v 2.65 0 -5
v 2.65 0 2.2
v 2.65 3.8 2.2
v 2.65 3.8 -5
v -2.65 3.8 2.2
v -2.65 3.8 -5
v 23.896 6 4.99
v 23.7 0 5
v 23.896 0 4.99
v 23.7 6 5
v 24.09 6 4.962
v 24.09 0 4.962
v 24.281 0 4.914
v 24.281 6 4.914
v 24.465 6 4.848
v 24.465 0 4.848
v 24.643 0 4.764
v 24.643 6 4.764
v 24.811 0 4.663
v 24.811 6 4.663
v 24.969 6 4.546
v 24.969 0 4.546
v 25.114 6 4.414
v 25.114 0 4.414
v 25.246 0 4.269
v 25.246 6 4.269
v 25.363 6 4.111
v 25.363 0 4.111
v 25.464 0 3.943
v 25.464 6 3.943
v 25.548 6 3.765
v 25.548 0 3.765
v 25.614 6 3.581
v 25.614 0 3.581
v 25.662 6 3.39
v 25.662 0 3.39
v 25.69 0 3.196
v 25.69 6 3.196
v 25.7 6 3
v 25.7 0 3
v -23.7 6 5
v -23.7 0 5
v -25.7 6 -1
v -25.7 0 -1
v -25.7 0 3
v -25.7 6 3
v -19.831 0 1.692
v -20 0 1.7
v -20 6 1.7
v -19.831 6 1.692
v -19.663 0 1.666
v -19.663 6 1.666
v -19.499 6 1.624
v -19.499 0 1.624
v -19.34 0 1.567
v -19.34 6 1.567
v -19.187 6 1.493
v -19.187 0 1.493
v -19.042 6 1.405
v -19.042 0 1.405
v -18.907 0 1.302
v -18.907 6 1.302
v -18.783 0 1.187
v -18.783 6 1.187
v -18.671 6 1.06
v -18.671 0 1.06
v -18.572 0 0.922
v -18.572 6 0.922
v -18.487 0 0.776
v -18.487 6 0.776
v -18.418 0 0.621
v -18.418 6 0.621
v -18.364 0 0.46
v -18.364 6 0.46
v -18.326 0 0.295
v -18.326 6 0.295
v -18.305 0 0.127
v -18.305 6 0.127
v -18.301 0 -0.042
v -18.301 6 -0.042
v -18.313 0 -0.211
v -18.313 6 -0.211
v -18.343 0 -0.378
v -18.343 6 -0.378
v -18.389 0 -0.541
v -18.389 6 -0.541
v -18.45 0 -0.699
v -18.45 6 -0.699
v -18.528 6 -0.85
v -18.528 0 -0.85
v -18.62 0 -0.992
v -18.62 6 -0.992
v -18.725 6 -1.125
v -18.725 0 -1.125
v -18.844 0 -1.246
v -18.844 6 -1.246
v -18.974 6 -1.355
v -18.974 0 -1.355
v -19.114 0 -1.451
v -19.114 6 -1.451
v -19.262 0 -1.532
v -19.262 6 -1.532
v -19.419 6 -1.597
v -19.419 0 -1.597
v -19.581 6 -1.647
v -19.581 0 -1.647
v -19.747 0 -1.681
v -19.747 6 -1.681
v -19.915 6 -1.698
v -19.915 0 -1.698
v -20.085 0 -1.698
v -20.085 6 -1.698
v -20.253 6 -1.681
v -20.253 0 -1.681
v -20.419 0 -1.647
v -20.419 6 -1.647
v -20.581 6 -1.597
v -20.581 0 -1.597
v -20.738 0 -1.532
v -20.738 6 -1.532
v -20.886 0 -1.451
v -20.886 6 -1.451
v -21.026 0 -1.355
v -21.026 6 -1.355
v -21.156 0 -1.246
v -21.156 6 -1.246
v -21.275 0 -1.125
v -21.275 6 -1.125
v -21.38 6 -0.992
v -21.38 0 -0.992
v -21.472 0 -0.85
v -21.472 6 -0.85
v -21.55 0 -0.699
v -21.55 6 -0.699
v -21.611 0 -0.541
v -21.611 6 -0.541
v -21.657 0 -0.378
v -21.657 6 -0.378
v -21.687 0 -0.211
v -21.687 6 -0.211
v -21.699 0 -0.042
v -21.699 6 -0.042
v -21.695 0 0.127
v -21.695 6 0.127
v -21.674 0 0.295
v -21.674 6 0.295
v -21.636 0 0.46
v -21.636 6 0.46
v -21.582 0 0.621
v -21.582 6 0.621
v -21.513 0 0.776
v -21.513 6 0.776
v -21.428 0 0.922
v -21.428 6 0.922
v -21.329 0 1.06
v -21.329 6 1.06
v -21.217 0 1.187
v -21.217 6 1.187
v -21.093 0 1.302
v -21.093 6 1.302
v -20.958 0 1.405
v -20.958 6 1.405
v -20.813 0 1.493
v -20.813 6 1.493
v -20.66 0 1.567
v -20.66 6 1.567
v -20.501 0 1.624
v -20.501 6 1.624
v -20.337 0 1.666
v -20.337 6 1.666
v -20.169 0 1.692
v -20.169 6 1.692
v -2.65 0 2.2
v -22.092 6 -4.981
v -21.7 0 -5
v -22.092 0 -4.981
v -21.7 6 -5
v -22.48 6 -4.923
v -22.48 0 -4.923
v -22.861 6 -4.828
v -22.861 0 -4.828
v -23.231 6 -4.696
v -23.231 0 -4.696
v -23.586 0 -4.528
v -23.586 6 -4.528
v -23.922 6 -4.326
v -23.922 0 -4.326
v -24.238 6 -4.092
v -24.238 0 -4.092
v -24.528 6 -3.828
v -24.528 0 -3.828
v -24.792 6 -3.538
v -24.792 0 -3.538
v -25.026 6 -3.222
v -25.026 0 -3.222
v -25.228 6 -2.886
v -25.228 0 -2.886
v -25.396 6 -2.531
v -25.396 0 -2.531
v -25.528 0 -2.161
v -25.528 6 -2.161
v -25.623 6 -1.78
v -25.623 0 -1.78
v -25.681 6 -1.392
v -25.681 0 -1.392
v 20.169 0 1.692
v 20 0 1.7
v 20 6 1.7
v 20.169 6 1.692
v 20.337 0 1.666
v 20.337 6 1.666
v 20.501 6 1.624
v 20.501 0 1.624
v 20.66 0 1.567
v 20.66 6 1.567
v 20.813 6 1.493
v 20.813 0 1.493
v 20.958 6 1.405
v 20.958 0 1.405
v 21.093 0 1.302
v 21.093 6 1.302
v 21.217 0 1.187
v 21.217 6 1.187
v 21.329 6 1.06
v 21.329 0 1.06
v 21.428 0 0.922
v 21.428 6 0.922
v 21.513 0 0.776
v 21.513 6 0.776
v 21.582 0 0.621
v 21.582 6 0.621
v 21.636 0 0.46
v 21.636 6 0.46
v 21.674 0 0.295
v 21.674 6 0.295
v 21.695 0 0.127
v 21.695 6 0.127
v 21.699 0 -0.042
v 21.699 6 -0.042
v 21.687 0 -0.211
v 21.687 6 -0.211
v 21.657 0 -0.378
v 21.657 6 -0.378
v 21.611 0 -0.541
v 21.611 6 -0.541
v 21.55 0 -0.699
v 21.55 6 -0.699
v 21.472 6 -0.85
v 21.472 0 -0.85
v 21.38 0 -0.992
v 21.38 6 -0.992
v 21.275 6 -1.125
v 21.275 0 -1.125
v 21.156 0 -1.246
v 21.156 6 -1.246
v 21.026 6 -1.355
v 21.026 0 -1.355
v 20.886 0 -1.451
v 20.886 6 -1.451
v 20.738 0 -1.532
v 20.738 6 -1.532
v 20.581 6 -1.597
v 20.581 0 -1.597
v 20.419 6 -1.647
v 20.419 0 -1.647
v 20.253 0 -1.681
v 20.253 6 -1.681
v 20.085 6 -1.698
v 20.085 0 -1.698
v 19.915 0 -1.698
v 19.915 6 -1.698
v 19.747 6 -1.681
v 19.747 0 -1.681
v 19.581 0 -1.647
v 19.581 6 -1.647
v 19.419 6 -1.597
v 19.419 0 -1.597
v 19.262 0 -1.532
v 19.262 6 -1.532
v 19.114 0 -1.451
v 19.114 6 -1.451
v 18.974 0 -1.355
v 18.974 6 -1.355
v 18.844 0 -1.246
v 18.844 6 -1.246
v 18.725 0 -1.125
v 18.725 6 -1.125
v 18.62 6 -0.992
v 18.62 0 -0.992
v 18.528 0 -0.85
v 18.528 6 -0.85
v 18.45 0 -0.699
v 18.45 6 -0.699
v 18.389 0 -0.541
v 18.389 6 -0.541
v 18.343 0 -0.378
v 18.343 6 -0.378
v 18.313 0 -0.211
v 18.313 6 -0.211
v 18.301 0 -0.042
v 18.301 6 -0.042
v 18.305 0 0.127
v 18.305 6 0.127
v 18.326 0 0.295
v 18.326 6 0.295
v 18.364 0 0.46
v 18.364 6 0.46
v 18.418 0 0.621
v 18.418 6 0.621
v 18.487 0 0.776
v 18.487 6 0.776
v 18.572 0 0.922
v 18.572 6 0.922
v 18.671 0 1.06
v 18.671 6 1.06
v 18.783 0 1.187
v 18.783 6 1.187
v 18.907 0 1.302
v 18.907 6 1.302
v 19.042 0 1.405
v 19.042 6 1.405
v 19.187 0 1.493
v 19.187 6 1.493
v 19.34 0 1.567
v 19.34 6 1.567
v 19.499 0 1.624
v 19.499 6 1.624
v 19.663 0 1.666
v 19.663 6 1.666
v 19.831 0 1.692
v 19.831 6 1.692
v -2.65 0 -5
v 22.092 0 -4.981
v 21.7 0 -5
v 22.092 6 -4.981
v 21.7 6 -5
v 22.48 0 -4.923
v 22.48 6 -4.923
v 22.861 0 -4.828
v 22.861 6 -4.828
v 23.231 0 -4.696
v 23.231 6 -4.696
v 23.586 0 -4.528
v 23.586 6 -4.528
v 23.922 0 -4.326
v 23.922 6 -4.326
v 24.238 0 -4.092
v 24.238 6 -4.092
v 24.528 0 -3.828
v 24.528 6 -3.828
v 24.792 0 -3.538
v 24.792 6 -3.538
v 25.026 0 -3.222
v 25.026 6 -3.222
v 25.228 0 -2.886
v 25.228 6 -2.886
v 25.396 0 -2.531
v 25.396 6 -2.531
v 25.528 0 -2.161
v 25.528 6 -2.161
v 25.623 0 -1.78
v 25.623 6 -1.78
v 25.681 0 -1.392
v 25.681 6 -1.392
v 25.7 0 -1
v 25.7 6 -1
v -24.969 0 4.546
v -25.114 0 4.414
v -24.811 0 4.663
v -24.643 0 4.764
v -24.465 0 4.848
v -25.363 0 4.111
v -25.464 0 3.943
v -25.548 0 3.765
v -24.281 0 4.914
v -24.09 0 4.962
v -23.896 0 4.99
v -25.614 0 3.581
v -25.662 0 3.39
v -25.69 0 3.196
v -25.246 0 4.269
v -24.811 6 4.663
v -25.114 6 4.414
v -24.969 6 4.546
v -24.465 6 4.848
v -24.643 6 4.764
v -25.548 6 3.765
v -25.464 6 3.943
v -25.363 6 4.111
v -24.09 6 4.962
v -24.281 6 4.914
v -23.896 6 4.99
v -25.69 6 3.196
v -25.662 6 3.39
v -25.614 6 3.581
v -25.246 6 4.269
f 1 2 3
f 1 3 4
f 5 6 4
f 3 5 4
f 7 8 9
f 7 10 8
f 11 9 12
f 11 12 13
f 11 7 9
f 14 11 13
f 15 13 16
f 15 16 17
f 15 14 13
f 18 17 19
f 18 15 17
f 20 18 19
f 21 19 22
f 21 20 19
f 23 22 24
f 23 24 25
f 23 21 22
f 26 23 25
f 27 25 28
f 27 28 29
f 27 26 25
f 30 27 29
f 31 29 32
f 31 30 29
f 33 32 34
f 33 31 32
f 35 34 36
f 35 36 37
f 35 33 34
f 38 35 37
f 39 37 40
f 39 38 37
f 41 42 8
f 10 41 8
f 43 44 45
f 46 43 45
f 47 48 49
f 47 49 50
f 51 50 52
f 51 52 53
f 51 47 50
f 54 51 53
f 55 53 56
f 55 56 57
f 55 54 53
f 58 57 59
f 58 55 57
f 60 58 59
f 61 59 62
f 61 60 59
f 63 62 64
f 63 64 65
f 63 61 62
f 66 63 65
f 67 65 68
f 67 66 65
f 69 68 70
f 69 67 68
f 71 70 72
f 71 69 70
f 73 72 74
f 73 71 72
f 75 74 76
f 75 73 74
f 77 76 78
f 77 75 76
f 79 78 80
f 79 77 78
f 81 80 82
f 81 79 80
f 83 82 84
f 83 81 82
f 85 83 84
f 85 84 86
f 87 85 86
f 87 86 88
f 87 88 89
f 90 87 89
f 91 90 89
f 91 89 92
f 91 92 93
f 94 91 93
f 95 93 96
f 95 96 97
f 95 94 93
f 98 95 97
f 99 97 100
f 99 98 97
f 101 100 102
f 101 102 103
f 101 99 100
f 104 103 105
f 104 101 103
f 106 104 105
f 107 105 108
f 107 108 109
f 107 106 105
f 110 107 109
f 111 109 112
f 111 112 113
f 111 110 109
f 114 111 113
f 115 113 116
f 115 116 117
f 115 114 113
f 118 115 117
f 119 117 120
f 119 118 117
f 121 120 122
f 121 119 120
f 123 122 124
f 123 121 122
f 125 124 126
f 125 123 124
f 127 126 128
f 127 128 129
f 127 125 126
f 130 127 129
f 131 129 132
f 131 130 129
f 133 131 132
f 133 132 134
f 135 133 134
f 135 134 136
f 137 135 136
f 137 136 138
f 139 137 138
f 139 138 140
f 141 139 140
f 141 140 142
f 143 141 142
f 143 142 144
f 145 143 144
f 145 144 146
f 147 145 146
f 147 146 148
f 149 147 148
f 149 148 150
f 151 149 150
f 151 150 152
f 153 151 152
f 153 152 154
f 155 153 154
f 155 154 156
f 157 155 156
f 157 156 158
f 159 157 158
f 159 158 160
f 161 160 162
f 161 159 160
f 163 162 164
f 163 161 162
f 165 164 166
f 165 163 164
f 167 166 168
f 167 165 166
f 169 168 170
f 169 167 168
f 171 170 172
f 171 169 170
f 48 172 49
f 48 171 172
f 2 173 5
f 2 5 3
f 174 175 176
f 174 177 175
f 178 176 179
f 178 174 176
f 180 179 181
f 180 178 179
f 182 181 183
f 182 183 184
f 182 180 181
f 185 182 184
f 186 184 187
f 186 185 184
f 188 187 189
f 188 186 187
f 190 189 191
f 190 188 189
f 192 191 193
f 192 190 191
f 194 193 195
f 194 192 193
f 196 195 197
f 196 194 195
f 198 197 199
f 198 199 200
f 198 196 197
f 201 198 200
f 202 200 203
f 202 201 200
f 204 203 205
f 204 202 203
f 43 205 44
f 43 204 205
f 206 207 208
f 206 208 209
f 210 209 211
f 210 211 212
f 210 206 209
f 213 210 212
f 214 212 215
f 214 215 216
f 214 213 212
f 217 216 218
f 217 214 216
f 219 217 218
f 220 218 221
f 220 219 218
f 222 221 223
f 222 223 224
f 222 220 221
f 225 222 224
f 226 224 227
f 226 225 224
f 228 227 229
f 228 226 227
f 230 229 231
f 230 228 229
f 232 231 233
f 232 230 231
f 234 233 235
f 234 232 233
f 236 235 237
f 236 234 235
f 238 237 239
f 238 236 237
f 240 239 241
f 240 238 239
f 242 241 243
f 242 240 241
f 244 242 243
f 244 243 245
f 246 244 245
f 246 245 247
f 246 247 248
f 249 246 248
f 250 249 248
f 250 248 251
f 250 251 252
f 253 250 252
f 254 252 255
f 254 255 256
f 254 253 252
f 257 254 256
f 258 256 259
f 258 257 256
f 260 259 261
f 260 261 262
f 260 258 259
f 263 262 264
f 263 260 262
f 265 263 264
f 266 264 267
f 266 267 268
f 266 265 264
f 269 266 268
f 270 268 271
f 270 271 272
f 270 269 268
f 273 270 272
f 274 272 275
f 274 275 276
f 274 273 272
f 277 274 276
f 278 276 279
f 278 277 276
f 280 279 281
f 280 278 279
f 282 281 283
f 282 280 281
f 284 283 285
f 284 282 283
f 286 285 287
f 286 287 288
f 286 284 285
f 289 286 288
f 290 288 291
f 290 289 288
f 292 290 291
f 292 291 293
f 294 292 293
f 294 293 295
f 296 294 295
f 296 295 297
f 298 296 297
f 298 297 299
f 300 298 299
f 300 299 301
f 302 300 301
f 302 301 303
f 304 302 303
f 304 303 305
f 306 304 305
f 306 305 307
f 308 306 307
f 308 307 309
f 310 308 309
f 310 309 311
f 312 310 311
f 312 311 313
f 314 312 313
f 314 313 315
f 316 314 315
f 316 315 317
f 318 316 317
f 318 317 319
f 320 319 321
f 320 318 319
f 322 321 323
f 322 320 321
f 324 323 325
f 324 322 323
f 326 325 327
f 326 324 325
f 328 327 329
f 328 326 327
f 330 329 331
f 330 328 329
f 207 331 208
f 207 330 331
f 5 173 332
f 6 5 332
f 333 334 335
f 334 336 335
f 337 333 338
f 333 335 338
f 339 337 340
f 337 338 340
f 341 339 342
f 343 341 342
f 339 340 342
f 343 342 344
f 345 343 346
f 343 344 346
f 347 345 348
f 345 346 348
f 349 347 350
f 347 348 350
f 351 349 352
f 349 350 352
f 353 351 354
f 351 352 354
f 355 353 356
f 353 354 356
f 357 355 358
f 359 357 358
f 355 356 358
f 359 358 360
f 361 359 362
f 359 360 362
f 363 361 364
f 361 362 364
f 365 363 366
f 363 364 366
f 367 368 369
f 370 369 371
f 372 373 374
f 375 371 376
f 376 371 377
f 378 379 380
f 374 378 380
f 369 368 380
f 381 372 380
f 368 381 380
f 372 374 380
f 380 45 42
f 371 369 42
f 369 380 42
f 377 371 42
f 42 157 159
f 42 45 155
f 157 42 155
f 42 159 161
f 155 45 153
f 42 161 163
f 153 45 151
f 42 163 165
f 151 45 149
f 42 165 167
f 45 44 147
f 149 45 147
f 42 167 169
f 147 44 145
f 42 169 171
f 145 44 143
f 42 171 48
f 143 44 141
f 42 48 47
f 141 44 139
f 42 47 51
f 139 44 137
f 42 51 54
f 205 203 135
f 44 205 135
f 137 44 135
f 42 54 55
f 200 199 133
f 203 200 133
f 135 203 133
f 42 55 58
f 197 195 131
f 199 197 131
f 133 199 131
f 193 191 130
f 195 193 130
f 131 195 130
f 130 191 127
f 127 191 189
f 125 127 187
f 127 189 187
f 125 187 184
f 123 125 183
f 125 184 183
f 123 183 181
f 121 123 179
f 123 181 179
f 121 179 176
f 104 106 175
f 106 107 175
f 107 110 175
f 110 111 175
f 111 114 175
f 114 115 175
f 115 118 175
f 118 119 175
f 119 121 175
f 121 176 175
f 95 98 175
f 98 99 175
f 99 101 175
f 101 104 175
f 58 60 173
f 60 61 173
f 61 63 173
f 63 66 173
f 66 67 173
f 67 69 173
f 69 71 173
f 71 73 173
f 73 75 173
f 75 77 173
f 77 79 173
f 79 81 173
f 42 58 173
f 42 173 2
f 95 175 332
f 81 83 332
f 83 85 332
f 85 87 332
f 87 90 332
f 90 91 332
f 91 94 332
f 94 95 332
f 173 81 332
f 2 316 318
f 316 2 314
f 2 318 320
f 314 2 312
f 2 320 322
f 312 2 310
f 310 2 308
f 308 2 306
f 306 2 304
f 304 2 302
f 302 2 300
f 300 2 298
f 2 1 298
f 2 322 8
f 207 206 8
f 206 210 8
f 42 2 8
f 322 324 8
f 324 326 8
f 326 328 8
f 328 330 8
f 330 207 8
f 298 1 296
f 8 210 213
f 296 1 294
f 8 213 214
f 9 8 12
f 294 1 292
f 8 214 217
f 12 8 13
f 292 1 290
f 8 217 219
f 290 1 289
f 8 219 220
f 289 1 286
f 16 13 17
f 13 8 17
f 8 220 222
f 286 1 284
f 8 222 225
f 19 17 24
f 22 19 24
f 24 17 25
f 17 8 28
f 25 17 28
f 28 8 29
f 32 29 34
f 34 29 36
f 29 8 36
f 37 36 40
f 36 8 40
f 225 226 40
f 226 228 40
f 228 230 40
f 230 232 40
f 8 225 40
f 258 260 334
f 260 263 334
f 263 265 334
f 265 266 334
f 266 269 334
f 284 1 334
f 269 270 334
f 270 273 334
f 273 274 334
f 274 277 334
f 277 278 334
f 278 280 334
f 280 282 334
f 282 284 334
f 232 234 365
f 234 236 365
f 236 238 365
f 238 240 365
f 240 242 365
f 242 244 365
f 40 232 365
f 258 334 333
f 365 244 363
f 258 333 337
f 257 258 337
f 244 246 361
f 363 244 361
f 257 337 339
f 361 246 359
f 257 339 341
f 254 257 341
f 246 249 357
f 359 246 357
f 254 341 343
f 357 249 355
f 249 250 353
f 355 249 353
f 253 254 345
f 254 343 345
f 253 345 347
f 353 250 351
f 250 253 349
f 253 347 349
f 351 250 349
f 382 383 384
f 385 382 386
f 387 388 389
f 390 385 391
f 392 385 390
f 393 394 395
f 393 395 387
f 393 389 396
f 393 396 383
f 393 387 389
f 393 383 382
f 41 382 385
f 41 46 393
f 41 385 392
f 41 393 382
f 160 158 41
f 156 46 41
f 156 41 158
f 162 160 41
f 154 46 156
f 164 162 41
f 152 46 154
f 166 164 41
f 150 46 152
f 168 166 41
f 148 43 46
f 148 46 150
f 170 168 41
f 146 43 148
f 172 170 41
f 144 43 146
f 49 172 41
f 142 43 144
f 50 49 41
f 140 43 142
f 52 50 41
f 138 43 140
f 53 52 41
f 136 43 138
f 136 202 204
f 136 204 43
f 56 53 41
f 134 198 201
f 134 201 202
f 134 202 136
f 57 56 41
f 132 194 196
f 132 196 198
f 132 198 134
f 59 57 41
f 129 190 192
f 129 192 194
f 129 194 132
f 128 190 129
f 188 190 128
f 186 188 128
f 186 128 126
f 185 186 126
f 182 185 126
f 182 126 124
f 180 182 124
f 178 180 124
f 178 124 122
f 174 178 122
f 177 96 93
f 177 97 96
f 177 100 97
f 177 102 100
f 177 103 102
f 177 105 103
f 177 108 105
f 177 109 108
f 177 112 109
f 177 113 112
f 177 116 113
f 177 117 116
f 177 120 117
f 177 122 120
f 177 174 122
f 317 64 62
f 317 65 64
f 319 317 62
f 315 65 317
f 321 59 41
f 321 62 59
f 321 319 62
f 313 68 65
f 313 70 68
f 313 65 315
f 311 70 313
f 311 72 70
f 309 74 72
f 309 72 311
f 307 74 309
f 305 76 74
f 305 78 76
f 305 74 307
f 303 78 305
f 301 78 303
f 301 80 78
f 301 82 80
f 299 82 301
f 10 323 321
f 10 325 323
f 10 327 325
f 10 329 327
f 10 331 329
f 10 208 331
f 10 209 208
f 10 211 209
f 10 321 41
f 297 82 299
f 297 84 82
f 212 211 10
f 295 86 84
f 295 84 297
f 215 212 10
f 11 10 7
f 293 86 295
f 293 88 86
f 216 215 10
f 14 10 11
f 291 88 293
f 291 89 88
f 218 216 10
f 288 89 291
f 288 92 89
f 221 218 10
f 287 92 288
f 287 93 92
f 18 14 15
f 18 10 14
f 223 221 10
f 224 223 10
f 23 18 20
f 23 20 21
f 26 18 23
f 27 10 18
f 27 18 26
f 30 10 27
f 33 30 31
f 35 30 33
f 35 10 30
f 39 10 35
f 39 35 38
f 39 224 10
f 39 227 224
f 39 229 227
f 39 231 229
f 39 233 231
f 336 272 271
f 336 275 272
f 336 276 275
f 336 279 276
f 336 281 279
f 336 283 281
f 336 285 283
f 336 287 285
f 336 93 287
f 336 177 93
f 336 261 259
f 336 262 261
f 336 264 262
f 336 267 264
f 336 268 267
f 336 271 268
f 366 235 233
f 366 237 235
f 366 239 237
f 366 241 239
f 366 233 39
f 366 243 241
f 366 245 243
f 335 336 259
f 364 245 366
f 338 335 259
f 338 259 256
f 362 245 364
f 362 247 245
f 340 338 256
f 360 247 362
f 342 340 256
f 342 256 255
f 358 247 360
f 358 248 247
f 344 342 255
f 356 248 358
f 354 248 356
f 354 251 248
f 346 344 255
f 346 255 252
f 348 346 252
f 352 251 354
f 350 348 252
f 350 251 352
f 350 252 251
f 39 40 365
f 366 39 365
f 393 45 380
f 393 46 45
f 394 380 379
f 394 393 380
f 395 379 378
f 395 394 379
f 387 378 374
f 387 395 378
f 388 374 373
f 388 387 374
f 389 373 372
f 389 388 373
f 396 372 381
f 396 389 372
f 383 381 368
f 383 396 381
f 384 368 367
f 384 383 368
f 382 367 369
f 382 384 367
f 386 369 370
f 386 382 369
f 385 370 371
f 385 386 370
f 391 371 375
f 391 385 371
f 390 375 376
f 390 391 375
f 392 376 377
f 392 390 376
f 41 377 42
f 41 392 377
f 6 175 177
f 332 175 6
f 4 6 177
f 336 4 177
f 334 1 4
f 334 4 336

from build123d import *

# Parameters (mm, degrees)
SKETCH1_W           = 51.4
SKETCH1_H           = 10
SKETCH1_R           = 1.7
BOSS_EXTRUDE2_DEPTH = 6
SKETCH1_4_W         = 5.3
SKETCH1_4_H         = 7.2
CUT_EXTRUDE1_DEPTH  = 3.8
FILLET2_R           = 4
FILLET3_R           = 2


with BuildPart() as part:
    # Sketch1 → Boss-Extrude2 (new body)
    with BuildSketch(Plane(origin=(0, 0, 0), x_dir=(1, 0, 0), z_dir=(0, 1, 0))):
        Rectangle(SKETCH1_W, SKETCH1_H)
        with Locations((-20, 0)):
            Circle(SKETCH1_R, mode=Mode.SUBTRACT)
        with Locations((20, 0)):
            Circle(SKETCH1_R, mode=Mode.SUBTRACT)
    extrude(amount=BOSS_EXTRUDE2_DEPTH)

    # Sketch1<4> → Cut-Extrude1 (cut)
    with BuildSketch(Plane(origin=(0, 0, 0), x_dir=(1, 0, 0), z_dir=(0, 1, 0))):
        with Locations((0, 1.4)):
            Rectangle(SKETCH1_4_W, SKETCH1_4_H)
    extrude(amount=CUT_EXTRUDE1_DEPTH, mode=Mode.SUBTRACT)

    # Fillet2
    fillet2_edges = [part.edges().sort_by_distance(p)[0] for p in [
        (25.7, 3, -5),
        (-25.7, 3, -5),
    ]]
    fillet(fillet2_edges, radius=FILLET2_R)

    # Fillet3
    fillet3_edges = [part.edges().sort_by_distance(p)[0] for p in [
        (25.7, 3, 5),
        (-25.7, 3, 5),
    ]]
    fillet(fillet3_edges, radius=FILLET3_R)


solid = part.part
